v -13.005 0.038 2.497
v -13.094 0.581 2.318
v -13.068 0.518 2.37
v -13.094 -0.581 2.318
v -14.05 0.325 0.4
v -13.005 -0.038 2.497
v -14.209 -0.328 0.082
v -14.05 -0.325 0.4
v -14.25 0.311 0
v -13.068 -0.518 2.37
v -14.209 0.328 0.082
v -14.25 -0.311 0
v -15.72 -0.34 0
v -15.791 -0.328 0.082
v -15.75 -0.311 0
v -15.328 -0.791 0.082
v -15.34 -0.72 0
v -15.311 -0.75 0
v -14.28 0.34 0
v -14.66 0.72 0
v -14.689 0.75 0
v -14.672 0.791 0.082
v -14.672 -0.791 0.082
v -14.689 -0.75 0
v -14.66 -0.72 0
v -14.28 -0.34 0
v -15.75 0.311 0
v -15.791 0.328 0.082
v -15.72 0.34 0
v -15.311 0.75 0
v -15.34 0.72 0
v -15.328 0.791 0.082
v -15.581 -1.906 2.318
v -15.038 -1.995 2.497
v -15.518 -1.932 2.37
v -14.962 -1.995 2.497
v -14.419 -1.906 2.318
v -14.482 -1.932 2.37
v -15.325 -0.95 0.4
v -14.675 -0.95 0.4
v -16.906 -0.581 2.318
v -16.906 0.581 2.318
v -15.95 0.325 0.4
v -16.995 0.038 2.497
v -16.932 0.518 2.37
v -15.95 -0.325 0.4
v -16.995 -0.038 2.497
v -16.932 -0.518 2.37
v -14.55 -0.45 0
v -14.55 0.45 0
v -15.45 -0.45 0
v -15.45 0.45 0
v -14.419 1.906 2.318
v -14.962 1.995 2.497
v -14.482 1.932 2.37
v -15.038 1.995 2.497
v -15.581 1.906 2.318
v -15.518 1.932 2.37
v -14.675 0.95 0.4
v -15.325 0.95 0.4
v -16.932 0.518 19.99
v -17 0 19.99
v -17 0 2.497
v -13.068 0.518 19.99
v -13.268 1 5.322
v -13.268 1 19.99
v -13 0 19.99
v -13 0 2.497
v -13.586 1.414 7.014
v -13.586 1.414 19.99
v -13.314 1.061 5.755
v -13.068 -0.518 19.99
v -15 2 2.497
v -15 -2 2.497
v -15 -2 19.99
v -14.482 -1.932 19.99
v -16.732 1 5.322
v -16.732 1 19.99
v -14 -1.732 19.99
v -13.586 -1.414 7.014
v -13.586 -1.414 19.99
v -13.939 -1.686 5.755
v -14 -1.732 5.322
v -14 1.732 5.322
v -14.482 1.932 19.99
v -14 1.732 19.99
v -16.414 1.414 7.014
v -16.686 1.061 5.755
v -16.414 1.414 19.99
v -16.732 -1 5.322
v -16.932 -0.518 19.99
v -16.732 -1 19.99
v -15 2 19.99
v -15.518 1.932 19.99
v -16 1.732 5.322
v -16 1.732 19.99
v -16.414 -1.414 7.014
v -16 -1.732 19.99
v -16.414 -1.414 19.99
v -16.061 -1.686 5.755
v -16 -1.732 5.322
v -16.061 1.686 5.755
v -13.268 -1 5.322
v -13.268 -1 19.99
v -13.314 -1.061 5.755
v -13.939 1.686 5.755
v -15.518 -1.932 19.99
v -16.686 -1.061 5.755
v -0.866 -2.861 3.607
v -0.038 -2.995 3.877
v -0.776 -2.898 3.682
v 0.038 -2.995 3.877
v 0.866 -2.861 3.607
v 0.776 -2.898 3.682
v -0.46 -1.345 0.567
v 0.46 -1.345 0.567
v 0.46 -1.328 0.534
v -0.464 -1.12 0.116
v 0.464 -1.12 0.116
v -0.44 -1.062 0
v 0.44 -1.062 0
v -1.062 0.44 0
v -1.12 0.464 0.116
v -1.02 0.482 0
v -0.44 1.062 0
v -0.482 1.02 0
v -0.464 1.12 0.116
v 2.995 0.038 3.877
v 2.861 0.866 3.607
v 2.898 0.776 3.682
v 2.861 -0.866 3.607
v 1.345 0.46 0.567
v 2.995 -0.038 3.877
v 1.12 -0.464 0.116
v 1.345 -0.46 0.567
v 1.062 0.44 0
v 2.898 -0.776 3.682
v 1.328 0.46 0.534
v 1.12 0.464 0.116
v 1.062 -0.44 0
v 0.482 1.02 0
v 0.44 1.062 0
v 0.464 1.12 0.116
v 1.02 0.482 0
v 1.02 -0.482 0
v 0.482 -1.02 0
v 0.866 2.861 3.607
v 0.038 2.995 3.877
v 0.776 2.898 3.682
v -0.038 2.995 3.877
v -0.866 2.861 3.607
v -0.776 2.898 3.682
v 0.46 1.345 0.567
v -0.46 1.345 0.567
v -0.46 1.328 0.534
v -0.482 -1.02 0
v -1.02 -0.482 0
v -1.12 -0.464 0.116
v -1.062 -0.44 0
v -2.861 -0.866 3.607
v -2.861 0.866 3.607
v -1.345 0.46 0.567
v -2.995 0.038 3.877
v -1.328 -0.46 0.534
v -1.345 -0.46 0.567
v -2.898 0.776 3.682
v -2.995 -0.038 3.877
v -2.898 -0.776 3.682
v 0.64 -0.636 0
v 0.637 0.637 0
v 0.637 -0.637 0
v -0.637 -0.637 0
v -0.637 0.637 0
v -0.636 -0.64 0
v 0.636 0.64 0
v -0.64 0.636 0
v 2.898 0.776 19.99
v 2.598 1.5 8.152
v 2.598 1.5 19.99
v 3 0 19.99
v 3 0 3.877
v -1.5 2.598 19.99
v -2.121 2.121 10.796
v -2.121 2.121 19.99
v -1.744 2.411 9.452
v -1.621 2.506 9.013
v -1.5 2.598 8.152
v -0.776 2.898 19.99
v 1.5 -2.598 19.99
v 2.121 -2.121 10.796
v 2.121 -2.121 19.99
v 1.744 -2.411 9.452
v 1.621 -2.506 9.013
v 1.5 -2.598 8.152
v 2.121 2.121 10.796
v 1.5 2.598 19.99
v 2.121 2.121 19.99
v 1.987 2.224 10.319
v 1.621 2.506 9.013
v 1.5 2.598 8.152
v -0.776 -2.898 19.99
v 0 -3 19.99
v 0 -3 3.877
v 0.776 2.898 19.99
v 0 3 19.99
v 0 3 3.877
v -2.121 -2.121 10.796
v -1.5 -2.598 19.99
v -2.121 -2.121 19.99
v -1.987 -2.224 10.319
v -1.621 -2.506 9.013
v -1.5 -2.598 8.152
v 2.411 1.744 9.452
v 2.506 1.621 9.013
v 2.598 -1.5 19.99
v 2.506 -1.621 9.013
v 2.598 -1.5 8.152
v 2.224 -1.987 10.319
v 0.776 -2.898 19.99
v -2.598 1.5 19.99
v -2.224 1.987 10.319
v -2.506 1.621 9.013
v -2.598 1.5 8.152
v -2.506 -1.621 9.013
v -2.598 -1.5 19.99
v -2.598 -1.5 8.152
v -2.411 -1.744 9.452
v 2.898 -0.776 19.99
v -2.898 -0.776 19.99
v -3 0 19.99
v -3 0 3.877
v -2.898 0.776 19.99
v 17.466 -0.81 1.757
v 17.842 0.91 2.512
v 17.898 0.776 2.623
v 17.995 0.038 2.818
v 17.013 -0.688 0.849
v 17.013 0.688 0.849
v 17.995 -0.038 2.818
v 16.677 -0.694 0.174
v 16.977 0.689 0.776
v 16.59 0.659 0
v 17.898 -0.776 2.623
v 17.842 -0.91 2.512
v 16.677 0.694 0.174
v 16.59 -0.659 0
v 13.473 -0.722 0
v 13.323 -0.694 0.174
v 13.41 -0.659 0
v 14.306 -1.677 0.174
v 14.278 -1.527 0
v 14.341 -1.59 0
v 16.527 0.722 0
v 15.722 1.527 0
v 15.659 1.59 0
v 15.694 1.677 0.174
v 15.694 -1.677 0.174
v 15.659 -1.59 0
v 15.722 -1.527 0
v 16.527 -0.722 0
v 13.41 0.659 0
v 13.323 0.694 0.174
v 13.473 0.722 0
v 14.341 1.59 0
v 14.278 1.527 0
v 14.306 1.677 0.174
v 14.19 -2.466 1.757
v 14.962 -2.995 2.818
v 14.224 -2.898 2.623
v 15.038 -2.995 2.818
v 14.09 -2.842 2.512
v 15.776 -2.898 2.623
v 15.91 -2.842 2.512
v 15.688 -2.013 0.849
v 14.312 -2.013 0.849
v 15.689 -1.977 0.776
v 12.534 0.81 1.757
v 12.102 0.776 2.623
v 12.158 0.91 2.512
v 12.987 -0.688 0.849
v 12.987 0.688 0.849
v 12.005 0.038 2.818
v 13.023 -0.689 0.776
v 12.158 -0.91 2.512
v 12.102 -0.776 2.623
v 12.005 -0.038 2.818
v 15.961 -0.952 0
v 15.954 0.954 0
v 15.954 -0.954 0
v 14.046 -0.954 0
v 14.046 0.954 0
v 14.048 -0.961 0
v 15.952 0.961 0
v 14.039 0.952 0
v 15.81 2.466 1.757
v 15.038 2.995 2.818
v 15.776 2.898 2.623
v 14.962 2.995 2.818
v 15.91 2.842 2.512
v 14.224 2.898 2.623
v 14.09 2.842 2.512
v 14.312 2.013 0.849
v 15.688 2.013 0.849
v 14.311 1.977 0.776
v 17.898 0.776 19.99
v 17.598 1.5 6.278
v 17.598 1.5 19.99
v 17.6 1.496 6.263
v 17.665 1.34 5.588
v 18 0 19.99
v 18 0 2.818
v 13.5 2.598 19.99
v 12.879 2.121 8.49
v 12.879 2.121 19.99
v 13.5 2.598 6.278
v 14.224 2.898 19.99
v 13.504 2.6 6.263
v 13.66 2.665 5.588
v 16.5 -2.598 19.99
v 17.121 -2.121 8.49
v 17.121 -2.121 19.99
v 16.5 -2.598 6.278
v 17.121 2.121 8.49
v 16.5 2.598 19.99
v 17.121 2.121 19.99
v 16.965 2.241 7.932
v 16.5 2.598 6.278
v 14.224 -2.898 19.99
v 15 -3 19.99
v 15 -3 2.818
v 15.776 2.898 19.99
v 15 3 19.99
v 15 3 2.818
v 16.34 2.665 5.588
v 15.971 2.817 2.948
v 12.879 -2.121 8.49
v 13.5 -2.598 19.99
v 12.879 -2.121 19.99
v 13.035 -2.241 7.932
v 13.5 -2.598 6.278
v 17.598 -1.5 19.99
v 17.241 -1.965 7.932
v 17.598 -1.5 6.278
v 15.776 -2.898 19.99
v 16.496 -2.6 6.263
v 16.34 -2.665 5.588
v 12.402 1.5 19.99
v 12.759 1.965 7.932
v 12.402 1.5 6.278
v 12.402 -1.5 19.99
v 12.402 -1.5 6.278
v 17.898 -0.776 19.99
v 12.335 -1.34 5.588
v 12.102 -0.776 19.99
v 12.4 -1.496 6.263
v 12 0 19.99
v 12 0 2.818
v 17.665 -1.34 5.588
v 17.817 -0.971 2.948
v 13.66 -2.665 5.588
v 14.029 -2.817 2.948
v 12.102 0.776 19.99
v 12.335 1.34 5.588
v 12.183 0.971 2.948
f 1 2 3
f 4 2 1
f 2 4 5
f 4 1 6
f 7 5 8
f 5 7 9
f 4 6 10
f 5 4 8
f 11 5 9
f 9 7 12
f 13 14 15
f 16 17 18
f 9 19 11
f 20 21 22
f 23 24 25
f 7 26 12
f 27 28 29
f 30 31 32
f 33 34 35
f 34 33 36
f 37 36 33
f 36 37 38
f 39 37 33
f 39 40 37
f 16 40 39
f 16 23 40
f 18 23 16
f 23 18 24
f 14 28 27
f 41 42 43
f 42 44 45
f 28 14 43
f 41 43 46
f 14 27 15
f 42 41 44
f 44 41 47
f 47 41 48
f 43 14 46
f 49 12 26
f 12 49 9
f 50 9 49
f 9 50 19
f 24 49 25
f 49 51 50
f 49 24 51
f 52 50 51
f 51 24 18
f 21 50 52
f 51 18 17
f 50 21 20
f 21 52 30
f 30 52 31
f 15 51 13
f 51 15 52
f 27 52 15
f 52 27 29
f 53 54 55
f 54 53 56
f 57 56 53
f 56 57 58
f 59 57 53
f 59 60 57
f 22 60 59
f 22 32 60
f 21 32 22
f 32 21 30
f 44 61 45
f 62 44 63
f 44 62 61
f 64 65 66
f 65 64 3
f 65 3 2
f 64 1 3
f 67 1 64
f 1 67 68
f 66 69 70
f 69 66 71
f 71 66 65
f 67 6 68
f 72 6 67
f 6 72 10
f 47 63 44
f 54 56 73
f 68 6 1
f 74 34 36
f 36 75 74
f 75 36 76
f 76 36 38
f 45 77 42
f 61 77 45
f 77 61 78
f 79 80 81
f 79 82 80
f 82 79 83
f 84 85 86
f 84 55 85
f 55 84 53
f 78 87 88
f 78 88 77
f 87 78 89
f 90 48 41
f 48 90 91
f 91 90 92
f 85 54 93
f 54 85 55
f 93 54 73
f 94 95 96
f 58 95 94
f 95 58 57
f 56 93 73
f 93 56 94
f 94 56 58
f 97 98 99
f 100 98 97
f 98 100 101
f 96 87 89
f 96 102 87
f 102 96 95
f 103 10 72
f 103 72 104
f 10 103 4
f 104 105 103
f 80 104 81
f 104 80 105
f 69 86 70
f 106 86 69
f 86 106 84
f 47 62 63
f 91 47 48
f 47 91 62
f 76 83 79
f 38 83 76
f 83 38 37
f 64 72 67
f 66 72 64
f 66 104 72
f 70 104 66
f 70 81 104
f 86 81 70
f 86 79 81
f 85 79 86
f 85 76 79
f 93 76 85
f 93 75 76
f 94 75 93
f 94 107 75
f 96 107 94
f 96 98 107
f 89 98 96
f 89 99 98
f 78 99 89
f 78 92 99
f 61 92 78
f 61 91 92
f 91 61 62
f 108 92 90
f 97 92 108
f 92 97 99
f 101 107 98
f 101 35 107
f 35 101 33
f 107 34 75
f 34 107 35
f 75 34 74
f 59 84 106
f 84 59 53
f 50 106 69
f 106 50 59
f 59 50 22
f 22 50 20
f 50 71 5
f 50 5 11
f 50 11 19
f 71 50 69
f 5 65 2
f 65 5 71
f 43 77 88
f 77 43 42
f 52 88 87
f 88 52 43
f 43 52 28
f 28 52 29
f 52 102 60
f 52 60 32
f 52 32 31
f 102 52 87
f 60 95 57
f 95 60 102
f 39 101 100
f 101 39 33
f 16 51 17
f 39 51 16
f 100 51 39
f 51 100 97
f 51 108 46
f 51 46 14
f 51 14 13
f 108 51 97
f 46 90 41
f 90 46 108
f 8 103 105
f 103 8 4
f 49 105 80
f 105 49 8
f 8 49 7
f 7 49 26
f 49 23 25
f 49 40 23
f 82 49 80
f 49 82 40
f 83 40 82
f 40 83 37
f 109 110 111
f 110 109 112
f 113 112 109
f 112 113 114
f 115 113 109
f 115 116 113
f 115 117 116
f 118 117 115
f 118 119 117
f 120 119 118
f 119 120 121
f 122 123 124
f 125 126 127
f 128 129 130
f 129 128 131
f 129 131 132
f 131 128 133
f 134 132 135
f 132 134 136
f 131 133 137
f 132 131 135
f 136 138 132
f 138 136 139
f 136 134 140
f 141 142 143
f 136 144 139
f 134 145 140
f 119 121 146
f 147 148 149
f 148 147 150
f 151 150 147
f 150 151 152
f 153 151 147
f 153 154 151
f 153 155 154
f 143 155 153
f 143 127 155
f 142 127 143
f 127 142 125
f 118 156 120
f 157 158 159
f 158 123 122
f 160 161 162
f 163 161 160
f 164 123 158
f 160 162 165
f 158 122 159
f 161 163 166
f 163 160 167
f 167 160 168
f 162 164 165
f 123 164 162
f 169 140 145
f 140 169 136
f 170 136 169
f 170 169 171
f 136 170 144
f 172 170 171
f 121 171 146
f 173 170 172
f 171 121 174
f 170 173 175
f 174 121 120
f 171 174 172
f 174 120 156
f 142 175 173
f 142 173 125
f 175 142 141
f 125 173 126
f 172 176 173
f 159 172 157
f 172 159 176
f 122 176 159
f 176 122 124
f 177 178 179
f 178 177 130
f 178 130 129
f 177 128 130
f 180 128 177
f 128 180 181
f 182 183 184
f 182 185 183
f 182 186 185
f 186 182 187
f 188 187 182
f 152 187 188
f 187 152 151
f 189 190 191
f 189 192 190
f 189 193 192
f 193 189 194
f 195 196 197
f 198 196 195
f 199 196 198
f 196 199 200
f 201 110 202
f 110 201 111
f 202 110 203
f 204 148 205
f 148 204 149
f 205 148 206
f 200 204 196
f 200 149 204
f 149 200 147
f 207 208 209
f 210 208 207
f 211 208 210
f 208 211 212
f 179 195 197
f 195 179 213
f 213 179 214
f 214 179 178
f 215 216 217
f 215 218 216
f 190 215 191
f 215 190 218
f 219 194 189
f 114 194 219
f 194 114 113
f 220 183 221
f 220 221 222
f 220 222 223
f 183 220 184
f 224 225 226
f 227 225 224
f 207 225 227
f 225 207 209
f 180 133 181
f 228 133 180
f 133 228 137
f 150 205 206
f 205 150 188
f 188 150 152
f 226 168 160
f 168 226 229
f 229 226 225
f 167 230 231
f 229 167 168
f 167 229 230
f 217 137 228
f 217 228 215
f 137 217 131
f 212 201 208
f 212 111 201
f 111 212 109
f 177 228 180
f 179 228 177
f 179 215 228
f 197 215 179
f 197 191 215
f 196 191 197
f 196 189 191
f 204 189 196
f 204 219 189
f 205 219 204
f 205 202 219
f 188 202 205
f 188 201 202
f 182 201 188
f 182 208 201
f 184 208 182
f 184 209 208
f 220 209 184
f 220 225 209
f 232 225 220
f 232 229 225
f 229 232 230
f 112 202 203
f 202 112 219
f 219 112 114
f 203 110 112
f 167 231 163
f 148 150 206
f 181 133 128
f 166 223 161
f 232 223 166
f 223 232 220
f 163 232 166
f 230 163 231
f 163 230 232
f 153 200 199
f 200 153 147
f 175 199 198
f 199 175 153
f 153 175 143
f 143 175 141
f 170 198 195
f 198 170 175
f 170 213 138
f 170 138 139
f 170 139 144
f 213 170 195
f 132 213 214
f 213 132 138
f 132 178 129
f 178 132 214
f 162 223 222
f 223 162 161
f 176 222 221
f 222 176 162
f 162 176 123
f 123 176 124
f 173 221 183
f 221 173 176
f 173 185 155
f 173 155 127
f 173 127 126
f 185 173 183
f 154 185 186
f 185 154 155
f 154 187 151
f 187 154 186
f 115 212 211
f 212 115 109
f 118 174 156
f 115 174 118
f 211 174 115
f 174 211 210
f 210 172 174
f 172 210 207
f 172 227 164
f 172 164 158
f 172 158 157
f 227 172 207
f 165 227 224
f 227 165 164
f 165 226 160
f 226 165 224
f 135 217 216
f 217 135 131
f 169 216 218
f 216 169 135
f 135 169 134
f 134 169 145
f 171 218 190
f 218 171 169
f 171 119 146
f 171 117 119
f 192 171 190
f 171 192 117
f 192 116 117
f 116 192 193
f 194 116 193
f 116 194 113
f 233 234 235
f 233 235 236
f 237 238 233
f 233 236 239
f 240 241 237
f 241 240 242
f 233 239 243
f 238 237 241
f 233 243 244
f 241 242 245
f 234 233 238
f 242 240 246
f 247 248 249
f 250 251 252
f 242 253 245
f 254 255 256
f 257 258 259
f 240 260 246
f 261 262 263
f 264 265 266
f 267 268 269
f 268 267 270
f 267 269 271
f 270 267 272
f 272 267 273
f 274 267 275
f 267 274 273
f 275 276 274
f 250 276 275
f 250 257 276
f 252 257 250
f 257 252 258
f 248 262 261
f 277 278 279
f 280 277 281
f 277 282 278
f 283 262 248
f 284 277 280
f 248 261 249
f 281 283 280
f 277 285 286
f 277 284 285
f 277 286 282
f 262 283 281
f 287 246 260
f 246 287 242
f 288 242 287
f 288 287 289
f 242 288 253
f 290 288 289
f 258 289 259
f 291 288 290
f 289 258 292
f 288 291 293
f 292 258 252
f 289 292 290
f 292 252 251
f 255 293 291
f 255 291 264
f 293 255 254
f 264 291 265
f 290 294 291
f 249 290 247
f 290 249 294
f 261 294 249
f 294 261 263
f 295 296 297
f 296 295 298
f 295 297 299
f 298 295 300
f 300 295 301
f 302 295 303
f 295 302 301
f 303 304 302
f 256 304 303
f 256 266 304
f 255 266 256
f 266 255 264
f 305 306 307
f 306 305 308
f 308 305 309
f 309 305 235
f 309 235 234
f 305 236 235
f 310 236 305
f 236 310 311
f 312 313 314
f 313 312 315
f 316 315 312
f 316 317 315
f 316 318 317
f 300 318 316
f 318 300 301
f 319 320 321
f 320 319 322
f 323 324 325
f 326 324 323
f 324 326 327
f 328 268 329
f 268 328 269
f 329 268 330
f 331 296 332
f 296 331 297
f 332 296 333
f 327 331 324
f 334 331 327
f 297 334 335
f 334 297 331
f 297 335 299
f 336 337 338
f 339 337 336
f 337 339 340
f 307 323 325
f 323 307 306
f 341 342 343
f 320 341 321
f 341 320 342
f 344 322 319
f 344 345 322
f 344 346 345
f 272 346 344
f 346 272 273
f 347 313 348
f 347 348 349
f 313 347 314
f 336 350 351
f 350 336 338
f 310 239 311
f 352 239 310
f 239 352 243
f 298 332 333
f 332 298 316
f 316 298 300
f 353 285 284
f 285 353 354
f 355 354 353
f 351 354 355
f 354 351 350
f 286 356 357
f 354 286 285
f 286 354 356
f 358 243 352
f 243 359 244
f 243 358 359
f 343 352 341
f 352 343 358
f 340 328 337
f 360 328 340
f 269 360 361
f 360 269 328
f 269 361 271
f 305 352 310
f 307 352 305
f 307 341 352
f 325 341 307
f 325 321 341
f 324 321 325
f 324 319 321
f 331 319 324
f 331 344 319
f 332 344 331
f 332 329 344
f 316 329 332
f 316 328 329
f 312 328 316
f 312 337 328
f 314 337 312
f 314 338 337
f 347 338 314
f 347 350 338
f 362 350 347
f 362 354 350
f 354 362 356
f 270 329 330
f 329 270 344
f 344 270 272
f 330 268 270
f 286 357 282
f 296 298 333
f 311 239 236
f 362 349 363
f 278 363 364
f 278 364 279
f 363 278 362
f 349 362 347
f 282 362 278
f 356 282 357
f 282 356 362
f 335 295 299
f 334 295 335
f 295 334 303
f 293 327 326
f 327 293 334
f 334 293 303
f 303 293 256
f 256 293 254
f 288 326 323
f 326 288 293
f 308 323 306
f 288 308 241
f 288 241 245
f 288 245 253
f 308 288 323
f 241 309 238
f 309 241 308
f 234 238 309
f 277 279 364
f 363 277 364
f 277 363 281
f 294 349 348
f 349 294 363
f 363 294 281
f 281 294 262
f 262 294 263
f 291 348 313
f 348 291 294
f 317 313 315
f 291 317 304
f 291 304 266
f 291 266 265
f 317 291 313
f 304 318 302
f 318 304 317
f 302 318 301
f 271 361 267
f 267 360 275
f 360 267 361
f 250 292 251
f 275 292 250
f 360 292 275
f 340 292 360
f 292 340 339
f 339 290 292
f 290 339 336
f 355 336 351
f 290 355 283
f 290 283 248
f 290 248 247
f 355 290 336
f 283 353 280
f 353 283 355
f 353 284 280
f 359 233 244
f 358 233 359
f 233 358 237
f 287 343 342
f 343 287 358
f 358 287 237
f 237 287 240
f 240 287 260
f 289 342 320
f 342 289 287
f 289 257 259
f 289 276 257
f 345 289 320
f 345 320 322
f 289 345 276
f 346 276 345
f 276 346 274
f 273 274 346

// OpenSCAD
// file: GEOL/phillips_drive.scad
// GEOL (Geometric Engine Optimized Library) - Phillips Drive Module
// High-performance, library-free parametric phillips driver bit and screwdriver bits.
// Optimized for fast OpenCascade kernel evaluation.
// Created: 2026-05-19

// ==========================================
// Directional Vectors & Orientation Constants
// ==========================================
V_LEFT   = [-1,  0,  0];
V_RIGHT  = [ 1,  0,  0];
V_FWD    = [ 0, -1,  0];
V_BACK   = [ 0,  1,  0];
V_DOWN   = [ 0,  0, -1];
V_UP     = [ 0,  0,  1];
V_CENTER = [ 0,  0,  0];

ORIENT_X = [90,  0,  90];
ORIENT_Y = [90,  0, 180];
ORIENT_Z = [ 0,  0,   0];

// ==========================================
// Utility Modules
// ==========================================
module up(z)      { translate([0, 0, z]) children(); }
module down(z)    { translate([0, 0, -z]) children(); }
module right(x)   { translate([x, 0, 0]) children(); }
module left(x)    { translate([-x, 0, 0]) children(); }
module back(y)    { translate([0, y, 0]) children(); }
module fwd(y)     { translate([0, -y, 0]) children(); }
module xrot(a)    { rotate([a, 0, 0]) children(); }
module yrot(a)    { rotate([0, a, 0]) children(); }
module zrot(a)    { rotate([0, 0, a]) children(); }

module zring(n=2) {
    for (i = [0 : n - 1]) {
        rotate([0, 0, i * 360 / n]) children();
    }
}

// Helper to check if a variable is defined
function is_def(v) = (v != undef);

// Proportional orientation and alignment tool
module orient_and_align(size, orient=ORIENT_Z, align=V_CENTER, orig_orient=ORIENT_Z) {
    rotsize = 
        (orient == [90, 0, 90])  ? [size[2], size[0], size[1]] : // X
        (orient == [90, 0, 180]) ? [size[0], size[2], size[1]] : // Y
                                   [size[0], size[1], size[2]];  // Z
                                   
    tx = align[0] * rotsize[0] / 2;
    ty = align[1] * rotsize[1] / 2;
    tz = align[2] * rotsize[2] / 2;

    translate([tx, ty, tz]) {
        if (orig_orient == orient) {
            children();
        } else if (orig_orient == [90, 0, 180] && orient == [0, 0, 0]) {
            rotate([-90, 0, -180]) children();
        } else if (orig_orient == [90, 0, 180] && orient == [90, 0, 90]) {
            rotate([0, 0, 90]) children();
        } else {
            rotate(orient) rotate([-orig_orient[0], -orig_orient[1], -orig_orient[2]]) children();
        }
    }
}

// ==========================================
// 1. Functions (Lookup tables for standard Phillips tip sizes)
// ==========================================

function get_phillips_drive_radius(size) = lookup(size, [
        [1.0, 1.25],
        [2.0, 1.77],
        [3.0, 2.65]
    ]);

// ==========================================
// 2. Core Modules
// ==========================================

module phillips_drive(
    size="#2", 
    shaft=6, 
    l=20, 
    orient=ORIENT_Z, 
    align=V_UP
) {
    // Standard measurement parameters
    ang = 11;
    
    // Parse named size to lookup float equivalent
    sz_num = (size == "#1" || size == "1") ? 1.0 :
             (size == "#3" || size == "3") ? 3.0 : 2.0;
             
    r = get_phillips_drive_radius(sz_num);
    cr = r / 2;
    
    orient_and_align([shaft, shaft, l], orient, align) {
        down(l / 2) {
            difference() {
                // Watertight intersect boundary
                intersection() {
                    union() {
                        clip = (shaft - 1.2 * r) / 2 / tan(26.5);
                        zrot(360 / 8 / 2) 
                            cylinder(h=clip, d1=1.2 * r / cos(360 / 8 / 2), d2=shaft / cos(360 / 8 / 2), center=false, $fn=8);
                        up(clip - 0.01) 
                            cylinder(h=l - clip, d=shaft, center=false, $fn=24);
                    }
                    cylinder(d=shaft, h=l, center=false, $fn=24);
                }
                
                // Subtract 4 cruciform slots rotated around Z
                zrot(45) {
                    zring(n=4) {
                        yrot(ang) {
                            zrot(-45) {
                                off = (r / 2 - cr * (sqrt(2) - 1)) / sqrt(2);
                                translate([off, off, 0]) {
                                    linear_extrude(height=l * 2, convexity=4, center=false) {
                                        difference() {
                                            union() {
                                                square([shaft, shaft], center=false);
                                                back(cr) zrot(1.125) square([shaft, shaft], center=false);
                                                right(cr) zrot(-1.125) square([shaft, shaft], center=false);
                                            }
                                            difference() {
                                                square([cr * 2, cr * 2], center=true);
                                                translate([cr, cr, 0]) circle(r=cr, $fn=8);
                                            }
                                        }
                                    }
                                }
                            }
                        }
                    }
                }
            }
        }
    }
}
// main file
// GEOL (Geometric Engine Optimized Library) - Phillips Drive Showcase
// Demonstrates high-performance parametric phillips driver bits.
// Evaluates in milliseconds using OpenCascade B-Rep!

use <GEOL/phillips_drive.scad>

echo("--- STARTING SHOWCASE: GEOL PHILLIPS DRIVE ---");

// 1. Phillips size #1 (Left, X = -15)
translate([-15, 0, 0]) {
    color("dodgerblue") {
        phillips_drive(size="#1", shaft=4, l=20);
    }
}

// 2. Phillips size #2 (Center, X = 0)
translate([0, 0, 0]) {
    color("gold") {
        phillips_drive(size="#2", shaft=6, l=20);
    }
}

// 3. Phillips size #3 (Right, X = 15)
translate([15, 0, 0]) {
    color("crimson") {
        phillips_drive(size="#3", shaft=6, l=20);
    }
}

echo("--- SHOWCASE PREPARED FOR VIEWING ---");
